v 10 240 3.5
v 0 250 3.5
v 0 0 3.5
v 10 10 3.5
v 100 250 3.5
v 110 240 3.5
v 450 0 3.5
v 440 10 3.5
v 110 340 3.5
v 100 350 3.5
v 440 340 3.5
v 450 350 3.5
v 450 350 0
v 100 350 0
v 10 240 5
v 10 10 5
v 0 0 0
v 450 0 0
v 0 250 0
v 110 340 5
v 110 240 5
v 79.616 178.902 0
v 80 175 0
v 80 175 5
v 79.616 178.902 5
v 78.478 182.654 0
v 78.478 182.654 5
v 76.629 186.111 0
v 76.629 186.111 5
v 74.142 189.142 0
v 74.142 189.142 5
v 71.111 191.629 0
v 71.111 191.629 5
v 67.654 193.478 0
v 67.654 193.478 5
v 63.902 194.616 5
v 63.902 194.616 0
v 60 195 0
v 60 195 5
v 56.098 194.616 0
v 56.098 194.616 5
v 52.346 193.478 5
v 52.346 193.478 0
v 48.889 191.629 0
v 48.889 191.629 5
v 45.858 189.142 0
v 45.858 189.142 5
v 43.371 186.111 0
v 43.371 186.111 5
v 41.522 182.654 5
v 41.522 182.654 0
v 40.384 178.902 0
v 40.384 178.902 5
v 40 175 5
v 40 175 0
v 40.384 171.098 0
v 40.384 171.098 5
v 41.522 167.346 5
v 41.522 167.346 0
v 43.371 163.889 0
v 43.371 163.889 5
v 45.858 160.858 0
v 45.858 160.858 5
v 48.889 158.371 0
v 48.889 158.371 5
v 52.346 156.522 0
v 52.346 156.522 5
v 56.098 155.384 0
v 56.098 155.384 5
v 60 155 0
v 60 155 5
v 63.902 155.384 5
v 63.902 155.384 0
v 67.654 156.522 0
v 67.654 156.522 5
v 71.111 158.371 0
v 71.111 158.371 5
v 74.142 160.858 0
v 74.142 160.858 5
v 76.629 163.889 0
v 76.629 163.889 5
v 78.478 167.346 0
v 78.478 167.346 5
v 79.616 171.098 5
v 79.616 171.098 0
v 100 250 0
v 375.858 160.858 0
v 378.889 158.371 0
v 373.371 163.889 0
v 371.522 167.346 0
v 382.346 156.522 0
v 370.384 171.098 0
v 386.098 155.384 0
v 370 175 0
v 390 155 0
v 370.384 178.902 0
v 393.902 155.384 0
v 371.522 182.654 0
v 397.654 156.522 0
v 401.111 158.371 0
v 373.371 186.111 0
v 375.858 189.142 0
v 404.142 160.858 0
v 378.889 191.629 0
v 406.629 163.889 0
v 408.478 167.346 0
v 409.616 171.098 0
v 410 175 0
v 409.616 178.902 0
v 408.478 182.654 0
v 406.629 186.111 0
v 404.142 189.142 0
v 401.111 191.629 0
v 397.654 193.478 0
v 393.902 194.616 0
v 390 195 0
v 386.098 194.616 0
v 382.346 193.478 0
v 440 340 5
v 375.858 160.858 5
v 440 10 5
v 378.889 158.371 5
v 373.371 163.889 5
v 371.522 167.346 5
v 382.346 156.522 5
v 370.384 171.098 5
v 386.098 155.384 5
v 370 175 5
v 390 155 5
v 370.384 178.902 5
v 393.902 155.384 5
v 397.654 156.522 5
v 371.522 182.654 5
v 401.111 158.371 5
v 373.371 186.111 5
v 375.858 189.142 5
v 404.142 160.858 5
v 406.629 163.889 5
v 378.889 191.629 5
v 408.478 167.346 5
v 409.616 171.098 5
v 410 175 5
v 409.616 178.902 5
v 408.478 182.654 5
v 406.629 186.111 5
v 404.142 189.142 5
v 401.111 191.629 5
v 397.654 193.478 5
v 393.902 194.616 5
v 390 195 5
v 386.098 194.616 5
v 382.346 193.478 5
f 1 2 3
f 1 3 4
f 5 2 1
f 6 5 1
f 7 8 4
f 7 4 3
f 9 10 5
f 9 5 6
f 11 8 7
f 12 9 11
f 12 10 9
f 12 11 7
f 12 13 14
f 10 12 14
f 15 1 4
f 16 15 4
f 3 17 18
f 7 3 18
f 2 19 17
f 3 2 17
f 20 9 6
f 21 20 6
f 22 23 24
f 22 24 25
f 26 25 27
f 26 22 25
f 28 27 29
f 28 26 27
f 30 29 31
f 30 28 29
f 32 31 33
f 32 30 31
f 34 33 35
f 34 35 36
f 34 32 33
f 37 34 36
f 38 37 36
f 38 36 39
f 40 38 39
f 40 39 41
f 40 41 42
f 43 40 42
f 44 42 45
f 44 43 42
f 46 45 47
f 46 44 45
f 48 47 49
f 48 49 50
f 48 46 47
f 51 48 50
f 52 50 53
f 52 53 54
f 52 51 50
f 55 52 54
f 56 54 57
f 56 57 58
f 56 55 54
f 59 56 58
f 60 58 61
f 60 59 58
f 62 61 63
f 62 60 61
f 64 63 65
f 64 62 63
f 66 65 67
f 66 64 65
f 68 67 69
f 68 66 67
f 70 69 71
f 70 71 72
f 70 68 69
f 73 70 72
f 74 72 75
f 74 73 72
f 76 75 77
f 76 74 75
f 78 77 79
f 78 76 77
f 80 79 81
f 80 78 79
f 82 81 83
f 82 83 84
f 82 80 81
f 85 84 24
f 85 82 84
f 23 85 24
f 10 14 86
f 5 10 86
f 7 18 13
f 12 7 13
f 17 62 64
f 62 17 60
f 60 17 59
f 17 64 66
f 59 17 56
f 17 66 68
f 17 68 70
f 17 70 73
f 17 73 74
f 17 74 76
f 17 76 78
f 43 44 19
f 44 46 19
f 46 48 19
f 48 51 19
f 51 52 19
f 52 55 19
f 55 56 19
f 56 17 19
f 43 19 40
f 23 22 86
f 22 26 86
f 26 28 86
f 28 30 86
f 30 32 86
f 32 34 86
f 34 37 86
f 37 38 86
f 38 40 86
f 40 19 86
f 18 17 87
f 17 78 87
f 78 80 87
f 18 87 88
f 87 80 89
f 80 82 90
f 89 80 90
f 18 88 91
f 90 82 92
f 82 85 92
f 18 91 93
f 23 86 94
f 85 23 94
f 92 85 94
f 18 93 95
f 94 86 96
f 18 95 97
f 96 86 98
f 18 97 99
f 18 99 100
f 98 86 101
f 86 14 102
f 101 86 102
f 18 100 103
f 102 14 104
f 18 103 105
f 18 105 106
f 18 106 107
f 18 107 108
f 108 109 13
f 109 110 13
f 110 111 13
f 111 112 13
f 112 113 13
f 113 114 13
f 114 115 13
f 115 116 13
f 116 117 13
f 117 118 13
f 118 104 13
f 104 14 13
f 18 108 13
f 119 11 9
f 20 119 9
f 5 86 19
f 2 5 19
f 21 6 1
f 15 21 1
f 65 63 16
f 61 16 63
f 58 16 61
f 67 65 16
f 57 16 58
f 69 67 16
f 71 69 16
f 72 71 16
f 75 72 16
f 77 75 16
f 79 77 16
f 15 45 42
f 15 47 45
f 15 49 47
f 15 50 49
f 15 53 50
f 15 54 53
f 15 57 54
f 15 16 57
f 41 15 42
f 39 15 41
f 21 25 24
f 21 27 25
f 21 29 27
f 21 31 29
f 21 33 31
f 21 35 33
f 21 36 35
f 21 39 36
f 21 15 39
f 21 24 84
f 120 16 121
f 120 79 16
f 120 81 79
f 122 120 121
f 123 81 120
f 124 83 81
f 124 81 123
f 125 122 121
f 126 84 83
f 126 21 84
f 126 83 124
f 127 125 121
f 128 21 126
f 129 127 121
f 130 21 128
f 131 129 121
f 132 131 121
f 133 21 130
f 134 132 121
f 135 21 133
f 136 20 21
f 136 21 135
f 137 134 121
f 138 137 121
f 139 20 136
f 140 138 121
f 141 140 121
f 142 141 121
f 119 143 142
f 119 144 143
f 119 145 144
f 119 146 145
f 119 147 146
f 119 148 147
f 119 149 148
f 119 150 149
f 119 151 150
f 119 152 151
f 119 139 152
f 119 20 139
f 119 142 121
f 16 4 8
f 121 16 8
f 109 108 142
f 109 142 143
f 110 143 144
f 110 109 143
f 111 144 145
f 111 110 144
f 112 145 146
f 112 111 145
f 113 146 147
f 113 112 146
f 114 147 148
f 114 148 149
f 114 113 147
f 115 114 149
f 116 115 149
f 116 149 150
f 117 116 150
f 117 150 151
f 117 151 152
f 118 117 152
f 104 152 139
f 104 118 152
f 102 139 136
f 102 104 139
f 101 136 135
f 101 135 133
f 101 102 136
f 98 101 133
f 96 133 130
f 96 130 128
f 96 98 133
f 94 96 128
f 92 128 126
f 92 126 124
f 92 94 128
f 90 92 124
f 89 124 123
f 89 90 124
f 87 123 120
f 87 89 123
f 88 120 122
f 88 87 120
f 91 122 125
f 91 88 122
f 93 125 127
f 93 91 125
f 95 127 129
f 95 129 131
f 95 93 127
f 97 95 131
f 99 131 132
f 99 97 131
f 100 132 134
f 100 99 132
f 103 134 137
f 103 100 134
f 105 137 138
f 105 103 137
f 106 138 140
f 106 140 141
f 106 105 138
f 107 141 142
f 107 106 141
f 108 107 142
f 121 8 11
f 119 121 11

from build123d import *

# Parameters (mm, degrees)
F0_R     = 20
F1_DEPTH = 5
F2_DEPTH = 3.5


with BuildPart() as f1:
    # F0 (on Top) → F1 (new body)
    with BuildSketch(Plane.XY):
        Polygon((9.999996, 9.999996), (440.000004, 9.999996), (440.000004, 340.000004), (109.999996, 340.000004), (109.999996, 240.000004), (9.999996, 240.000004), align=None)
        with Locations((60, 175)):
            Circle(F0_R, mode=Mode.SUBTRACT)
        with Locations((390, 175)):
            Circle(F0_R, mode=Mode.SUBTRACT)
    extrude(amount=F1_DEPTH)

    # F0 (on Top) → F2 (join)
    with BuildSketch(Plane.XY):
        Polygon((0, 250), (0, 0), (450, 0), (450, 350), (100, 350), (100, 250), align=None)
        Polygon((440.000004, 340.000004), (440.000004, 9.999996), (9.999996, 9.999996), (9.999996, 240.000004), (109.999996, 240.000004), (109.999996, 340.000004), align=None, mode=Mode.SUBTRACT)
    extrude(amount=F2_DEPTH)


solid = f1.part
